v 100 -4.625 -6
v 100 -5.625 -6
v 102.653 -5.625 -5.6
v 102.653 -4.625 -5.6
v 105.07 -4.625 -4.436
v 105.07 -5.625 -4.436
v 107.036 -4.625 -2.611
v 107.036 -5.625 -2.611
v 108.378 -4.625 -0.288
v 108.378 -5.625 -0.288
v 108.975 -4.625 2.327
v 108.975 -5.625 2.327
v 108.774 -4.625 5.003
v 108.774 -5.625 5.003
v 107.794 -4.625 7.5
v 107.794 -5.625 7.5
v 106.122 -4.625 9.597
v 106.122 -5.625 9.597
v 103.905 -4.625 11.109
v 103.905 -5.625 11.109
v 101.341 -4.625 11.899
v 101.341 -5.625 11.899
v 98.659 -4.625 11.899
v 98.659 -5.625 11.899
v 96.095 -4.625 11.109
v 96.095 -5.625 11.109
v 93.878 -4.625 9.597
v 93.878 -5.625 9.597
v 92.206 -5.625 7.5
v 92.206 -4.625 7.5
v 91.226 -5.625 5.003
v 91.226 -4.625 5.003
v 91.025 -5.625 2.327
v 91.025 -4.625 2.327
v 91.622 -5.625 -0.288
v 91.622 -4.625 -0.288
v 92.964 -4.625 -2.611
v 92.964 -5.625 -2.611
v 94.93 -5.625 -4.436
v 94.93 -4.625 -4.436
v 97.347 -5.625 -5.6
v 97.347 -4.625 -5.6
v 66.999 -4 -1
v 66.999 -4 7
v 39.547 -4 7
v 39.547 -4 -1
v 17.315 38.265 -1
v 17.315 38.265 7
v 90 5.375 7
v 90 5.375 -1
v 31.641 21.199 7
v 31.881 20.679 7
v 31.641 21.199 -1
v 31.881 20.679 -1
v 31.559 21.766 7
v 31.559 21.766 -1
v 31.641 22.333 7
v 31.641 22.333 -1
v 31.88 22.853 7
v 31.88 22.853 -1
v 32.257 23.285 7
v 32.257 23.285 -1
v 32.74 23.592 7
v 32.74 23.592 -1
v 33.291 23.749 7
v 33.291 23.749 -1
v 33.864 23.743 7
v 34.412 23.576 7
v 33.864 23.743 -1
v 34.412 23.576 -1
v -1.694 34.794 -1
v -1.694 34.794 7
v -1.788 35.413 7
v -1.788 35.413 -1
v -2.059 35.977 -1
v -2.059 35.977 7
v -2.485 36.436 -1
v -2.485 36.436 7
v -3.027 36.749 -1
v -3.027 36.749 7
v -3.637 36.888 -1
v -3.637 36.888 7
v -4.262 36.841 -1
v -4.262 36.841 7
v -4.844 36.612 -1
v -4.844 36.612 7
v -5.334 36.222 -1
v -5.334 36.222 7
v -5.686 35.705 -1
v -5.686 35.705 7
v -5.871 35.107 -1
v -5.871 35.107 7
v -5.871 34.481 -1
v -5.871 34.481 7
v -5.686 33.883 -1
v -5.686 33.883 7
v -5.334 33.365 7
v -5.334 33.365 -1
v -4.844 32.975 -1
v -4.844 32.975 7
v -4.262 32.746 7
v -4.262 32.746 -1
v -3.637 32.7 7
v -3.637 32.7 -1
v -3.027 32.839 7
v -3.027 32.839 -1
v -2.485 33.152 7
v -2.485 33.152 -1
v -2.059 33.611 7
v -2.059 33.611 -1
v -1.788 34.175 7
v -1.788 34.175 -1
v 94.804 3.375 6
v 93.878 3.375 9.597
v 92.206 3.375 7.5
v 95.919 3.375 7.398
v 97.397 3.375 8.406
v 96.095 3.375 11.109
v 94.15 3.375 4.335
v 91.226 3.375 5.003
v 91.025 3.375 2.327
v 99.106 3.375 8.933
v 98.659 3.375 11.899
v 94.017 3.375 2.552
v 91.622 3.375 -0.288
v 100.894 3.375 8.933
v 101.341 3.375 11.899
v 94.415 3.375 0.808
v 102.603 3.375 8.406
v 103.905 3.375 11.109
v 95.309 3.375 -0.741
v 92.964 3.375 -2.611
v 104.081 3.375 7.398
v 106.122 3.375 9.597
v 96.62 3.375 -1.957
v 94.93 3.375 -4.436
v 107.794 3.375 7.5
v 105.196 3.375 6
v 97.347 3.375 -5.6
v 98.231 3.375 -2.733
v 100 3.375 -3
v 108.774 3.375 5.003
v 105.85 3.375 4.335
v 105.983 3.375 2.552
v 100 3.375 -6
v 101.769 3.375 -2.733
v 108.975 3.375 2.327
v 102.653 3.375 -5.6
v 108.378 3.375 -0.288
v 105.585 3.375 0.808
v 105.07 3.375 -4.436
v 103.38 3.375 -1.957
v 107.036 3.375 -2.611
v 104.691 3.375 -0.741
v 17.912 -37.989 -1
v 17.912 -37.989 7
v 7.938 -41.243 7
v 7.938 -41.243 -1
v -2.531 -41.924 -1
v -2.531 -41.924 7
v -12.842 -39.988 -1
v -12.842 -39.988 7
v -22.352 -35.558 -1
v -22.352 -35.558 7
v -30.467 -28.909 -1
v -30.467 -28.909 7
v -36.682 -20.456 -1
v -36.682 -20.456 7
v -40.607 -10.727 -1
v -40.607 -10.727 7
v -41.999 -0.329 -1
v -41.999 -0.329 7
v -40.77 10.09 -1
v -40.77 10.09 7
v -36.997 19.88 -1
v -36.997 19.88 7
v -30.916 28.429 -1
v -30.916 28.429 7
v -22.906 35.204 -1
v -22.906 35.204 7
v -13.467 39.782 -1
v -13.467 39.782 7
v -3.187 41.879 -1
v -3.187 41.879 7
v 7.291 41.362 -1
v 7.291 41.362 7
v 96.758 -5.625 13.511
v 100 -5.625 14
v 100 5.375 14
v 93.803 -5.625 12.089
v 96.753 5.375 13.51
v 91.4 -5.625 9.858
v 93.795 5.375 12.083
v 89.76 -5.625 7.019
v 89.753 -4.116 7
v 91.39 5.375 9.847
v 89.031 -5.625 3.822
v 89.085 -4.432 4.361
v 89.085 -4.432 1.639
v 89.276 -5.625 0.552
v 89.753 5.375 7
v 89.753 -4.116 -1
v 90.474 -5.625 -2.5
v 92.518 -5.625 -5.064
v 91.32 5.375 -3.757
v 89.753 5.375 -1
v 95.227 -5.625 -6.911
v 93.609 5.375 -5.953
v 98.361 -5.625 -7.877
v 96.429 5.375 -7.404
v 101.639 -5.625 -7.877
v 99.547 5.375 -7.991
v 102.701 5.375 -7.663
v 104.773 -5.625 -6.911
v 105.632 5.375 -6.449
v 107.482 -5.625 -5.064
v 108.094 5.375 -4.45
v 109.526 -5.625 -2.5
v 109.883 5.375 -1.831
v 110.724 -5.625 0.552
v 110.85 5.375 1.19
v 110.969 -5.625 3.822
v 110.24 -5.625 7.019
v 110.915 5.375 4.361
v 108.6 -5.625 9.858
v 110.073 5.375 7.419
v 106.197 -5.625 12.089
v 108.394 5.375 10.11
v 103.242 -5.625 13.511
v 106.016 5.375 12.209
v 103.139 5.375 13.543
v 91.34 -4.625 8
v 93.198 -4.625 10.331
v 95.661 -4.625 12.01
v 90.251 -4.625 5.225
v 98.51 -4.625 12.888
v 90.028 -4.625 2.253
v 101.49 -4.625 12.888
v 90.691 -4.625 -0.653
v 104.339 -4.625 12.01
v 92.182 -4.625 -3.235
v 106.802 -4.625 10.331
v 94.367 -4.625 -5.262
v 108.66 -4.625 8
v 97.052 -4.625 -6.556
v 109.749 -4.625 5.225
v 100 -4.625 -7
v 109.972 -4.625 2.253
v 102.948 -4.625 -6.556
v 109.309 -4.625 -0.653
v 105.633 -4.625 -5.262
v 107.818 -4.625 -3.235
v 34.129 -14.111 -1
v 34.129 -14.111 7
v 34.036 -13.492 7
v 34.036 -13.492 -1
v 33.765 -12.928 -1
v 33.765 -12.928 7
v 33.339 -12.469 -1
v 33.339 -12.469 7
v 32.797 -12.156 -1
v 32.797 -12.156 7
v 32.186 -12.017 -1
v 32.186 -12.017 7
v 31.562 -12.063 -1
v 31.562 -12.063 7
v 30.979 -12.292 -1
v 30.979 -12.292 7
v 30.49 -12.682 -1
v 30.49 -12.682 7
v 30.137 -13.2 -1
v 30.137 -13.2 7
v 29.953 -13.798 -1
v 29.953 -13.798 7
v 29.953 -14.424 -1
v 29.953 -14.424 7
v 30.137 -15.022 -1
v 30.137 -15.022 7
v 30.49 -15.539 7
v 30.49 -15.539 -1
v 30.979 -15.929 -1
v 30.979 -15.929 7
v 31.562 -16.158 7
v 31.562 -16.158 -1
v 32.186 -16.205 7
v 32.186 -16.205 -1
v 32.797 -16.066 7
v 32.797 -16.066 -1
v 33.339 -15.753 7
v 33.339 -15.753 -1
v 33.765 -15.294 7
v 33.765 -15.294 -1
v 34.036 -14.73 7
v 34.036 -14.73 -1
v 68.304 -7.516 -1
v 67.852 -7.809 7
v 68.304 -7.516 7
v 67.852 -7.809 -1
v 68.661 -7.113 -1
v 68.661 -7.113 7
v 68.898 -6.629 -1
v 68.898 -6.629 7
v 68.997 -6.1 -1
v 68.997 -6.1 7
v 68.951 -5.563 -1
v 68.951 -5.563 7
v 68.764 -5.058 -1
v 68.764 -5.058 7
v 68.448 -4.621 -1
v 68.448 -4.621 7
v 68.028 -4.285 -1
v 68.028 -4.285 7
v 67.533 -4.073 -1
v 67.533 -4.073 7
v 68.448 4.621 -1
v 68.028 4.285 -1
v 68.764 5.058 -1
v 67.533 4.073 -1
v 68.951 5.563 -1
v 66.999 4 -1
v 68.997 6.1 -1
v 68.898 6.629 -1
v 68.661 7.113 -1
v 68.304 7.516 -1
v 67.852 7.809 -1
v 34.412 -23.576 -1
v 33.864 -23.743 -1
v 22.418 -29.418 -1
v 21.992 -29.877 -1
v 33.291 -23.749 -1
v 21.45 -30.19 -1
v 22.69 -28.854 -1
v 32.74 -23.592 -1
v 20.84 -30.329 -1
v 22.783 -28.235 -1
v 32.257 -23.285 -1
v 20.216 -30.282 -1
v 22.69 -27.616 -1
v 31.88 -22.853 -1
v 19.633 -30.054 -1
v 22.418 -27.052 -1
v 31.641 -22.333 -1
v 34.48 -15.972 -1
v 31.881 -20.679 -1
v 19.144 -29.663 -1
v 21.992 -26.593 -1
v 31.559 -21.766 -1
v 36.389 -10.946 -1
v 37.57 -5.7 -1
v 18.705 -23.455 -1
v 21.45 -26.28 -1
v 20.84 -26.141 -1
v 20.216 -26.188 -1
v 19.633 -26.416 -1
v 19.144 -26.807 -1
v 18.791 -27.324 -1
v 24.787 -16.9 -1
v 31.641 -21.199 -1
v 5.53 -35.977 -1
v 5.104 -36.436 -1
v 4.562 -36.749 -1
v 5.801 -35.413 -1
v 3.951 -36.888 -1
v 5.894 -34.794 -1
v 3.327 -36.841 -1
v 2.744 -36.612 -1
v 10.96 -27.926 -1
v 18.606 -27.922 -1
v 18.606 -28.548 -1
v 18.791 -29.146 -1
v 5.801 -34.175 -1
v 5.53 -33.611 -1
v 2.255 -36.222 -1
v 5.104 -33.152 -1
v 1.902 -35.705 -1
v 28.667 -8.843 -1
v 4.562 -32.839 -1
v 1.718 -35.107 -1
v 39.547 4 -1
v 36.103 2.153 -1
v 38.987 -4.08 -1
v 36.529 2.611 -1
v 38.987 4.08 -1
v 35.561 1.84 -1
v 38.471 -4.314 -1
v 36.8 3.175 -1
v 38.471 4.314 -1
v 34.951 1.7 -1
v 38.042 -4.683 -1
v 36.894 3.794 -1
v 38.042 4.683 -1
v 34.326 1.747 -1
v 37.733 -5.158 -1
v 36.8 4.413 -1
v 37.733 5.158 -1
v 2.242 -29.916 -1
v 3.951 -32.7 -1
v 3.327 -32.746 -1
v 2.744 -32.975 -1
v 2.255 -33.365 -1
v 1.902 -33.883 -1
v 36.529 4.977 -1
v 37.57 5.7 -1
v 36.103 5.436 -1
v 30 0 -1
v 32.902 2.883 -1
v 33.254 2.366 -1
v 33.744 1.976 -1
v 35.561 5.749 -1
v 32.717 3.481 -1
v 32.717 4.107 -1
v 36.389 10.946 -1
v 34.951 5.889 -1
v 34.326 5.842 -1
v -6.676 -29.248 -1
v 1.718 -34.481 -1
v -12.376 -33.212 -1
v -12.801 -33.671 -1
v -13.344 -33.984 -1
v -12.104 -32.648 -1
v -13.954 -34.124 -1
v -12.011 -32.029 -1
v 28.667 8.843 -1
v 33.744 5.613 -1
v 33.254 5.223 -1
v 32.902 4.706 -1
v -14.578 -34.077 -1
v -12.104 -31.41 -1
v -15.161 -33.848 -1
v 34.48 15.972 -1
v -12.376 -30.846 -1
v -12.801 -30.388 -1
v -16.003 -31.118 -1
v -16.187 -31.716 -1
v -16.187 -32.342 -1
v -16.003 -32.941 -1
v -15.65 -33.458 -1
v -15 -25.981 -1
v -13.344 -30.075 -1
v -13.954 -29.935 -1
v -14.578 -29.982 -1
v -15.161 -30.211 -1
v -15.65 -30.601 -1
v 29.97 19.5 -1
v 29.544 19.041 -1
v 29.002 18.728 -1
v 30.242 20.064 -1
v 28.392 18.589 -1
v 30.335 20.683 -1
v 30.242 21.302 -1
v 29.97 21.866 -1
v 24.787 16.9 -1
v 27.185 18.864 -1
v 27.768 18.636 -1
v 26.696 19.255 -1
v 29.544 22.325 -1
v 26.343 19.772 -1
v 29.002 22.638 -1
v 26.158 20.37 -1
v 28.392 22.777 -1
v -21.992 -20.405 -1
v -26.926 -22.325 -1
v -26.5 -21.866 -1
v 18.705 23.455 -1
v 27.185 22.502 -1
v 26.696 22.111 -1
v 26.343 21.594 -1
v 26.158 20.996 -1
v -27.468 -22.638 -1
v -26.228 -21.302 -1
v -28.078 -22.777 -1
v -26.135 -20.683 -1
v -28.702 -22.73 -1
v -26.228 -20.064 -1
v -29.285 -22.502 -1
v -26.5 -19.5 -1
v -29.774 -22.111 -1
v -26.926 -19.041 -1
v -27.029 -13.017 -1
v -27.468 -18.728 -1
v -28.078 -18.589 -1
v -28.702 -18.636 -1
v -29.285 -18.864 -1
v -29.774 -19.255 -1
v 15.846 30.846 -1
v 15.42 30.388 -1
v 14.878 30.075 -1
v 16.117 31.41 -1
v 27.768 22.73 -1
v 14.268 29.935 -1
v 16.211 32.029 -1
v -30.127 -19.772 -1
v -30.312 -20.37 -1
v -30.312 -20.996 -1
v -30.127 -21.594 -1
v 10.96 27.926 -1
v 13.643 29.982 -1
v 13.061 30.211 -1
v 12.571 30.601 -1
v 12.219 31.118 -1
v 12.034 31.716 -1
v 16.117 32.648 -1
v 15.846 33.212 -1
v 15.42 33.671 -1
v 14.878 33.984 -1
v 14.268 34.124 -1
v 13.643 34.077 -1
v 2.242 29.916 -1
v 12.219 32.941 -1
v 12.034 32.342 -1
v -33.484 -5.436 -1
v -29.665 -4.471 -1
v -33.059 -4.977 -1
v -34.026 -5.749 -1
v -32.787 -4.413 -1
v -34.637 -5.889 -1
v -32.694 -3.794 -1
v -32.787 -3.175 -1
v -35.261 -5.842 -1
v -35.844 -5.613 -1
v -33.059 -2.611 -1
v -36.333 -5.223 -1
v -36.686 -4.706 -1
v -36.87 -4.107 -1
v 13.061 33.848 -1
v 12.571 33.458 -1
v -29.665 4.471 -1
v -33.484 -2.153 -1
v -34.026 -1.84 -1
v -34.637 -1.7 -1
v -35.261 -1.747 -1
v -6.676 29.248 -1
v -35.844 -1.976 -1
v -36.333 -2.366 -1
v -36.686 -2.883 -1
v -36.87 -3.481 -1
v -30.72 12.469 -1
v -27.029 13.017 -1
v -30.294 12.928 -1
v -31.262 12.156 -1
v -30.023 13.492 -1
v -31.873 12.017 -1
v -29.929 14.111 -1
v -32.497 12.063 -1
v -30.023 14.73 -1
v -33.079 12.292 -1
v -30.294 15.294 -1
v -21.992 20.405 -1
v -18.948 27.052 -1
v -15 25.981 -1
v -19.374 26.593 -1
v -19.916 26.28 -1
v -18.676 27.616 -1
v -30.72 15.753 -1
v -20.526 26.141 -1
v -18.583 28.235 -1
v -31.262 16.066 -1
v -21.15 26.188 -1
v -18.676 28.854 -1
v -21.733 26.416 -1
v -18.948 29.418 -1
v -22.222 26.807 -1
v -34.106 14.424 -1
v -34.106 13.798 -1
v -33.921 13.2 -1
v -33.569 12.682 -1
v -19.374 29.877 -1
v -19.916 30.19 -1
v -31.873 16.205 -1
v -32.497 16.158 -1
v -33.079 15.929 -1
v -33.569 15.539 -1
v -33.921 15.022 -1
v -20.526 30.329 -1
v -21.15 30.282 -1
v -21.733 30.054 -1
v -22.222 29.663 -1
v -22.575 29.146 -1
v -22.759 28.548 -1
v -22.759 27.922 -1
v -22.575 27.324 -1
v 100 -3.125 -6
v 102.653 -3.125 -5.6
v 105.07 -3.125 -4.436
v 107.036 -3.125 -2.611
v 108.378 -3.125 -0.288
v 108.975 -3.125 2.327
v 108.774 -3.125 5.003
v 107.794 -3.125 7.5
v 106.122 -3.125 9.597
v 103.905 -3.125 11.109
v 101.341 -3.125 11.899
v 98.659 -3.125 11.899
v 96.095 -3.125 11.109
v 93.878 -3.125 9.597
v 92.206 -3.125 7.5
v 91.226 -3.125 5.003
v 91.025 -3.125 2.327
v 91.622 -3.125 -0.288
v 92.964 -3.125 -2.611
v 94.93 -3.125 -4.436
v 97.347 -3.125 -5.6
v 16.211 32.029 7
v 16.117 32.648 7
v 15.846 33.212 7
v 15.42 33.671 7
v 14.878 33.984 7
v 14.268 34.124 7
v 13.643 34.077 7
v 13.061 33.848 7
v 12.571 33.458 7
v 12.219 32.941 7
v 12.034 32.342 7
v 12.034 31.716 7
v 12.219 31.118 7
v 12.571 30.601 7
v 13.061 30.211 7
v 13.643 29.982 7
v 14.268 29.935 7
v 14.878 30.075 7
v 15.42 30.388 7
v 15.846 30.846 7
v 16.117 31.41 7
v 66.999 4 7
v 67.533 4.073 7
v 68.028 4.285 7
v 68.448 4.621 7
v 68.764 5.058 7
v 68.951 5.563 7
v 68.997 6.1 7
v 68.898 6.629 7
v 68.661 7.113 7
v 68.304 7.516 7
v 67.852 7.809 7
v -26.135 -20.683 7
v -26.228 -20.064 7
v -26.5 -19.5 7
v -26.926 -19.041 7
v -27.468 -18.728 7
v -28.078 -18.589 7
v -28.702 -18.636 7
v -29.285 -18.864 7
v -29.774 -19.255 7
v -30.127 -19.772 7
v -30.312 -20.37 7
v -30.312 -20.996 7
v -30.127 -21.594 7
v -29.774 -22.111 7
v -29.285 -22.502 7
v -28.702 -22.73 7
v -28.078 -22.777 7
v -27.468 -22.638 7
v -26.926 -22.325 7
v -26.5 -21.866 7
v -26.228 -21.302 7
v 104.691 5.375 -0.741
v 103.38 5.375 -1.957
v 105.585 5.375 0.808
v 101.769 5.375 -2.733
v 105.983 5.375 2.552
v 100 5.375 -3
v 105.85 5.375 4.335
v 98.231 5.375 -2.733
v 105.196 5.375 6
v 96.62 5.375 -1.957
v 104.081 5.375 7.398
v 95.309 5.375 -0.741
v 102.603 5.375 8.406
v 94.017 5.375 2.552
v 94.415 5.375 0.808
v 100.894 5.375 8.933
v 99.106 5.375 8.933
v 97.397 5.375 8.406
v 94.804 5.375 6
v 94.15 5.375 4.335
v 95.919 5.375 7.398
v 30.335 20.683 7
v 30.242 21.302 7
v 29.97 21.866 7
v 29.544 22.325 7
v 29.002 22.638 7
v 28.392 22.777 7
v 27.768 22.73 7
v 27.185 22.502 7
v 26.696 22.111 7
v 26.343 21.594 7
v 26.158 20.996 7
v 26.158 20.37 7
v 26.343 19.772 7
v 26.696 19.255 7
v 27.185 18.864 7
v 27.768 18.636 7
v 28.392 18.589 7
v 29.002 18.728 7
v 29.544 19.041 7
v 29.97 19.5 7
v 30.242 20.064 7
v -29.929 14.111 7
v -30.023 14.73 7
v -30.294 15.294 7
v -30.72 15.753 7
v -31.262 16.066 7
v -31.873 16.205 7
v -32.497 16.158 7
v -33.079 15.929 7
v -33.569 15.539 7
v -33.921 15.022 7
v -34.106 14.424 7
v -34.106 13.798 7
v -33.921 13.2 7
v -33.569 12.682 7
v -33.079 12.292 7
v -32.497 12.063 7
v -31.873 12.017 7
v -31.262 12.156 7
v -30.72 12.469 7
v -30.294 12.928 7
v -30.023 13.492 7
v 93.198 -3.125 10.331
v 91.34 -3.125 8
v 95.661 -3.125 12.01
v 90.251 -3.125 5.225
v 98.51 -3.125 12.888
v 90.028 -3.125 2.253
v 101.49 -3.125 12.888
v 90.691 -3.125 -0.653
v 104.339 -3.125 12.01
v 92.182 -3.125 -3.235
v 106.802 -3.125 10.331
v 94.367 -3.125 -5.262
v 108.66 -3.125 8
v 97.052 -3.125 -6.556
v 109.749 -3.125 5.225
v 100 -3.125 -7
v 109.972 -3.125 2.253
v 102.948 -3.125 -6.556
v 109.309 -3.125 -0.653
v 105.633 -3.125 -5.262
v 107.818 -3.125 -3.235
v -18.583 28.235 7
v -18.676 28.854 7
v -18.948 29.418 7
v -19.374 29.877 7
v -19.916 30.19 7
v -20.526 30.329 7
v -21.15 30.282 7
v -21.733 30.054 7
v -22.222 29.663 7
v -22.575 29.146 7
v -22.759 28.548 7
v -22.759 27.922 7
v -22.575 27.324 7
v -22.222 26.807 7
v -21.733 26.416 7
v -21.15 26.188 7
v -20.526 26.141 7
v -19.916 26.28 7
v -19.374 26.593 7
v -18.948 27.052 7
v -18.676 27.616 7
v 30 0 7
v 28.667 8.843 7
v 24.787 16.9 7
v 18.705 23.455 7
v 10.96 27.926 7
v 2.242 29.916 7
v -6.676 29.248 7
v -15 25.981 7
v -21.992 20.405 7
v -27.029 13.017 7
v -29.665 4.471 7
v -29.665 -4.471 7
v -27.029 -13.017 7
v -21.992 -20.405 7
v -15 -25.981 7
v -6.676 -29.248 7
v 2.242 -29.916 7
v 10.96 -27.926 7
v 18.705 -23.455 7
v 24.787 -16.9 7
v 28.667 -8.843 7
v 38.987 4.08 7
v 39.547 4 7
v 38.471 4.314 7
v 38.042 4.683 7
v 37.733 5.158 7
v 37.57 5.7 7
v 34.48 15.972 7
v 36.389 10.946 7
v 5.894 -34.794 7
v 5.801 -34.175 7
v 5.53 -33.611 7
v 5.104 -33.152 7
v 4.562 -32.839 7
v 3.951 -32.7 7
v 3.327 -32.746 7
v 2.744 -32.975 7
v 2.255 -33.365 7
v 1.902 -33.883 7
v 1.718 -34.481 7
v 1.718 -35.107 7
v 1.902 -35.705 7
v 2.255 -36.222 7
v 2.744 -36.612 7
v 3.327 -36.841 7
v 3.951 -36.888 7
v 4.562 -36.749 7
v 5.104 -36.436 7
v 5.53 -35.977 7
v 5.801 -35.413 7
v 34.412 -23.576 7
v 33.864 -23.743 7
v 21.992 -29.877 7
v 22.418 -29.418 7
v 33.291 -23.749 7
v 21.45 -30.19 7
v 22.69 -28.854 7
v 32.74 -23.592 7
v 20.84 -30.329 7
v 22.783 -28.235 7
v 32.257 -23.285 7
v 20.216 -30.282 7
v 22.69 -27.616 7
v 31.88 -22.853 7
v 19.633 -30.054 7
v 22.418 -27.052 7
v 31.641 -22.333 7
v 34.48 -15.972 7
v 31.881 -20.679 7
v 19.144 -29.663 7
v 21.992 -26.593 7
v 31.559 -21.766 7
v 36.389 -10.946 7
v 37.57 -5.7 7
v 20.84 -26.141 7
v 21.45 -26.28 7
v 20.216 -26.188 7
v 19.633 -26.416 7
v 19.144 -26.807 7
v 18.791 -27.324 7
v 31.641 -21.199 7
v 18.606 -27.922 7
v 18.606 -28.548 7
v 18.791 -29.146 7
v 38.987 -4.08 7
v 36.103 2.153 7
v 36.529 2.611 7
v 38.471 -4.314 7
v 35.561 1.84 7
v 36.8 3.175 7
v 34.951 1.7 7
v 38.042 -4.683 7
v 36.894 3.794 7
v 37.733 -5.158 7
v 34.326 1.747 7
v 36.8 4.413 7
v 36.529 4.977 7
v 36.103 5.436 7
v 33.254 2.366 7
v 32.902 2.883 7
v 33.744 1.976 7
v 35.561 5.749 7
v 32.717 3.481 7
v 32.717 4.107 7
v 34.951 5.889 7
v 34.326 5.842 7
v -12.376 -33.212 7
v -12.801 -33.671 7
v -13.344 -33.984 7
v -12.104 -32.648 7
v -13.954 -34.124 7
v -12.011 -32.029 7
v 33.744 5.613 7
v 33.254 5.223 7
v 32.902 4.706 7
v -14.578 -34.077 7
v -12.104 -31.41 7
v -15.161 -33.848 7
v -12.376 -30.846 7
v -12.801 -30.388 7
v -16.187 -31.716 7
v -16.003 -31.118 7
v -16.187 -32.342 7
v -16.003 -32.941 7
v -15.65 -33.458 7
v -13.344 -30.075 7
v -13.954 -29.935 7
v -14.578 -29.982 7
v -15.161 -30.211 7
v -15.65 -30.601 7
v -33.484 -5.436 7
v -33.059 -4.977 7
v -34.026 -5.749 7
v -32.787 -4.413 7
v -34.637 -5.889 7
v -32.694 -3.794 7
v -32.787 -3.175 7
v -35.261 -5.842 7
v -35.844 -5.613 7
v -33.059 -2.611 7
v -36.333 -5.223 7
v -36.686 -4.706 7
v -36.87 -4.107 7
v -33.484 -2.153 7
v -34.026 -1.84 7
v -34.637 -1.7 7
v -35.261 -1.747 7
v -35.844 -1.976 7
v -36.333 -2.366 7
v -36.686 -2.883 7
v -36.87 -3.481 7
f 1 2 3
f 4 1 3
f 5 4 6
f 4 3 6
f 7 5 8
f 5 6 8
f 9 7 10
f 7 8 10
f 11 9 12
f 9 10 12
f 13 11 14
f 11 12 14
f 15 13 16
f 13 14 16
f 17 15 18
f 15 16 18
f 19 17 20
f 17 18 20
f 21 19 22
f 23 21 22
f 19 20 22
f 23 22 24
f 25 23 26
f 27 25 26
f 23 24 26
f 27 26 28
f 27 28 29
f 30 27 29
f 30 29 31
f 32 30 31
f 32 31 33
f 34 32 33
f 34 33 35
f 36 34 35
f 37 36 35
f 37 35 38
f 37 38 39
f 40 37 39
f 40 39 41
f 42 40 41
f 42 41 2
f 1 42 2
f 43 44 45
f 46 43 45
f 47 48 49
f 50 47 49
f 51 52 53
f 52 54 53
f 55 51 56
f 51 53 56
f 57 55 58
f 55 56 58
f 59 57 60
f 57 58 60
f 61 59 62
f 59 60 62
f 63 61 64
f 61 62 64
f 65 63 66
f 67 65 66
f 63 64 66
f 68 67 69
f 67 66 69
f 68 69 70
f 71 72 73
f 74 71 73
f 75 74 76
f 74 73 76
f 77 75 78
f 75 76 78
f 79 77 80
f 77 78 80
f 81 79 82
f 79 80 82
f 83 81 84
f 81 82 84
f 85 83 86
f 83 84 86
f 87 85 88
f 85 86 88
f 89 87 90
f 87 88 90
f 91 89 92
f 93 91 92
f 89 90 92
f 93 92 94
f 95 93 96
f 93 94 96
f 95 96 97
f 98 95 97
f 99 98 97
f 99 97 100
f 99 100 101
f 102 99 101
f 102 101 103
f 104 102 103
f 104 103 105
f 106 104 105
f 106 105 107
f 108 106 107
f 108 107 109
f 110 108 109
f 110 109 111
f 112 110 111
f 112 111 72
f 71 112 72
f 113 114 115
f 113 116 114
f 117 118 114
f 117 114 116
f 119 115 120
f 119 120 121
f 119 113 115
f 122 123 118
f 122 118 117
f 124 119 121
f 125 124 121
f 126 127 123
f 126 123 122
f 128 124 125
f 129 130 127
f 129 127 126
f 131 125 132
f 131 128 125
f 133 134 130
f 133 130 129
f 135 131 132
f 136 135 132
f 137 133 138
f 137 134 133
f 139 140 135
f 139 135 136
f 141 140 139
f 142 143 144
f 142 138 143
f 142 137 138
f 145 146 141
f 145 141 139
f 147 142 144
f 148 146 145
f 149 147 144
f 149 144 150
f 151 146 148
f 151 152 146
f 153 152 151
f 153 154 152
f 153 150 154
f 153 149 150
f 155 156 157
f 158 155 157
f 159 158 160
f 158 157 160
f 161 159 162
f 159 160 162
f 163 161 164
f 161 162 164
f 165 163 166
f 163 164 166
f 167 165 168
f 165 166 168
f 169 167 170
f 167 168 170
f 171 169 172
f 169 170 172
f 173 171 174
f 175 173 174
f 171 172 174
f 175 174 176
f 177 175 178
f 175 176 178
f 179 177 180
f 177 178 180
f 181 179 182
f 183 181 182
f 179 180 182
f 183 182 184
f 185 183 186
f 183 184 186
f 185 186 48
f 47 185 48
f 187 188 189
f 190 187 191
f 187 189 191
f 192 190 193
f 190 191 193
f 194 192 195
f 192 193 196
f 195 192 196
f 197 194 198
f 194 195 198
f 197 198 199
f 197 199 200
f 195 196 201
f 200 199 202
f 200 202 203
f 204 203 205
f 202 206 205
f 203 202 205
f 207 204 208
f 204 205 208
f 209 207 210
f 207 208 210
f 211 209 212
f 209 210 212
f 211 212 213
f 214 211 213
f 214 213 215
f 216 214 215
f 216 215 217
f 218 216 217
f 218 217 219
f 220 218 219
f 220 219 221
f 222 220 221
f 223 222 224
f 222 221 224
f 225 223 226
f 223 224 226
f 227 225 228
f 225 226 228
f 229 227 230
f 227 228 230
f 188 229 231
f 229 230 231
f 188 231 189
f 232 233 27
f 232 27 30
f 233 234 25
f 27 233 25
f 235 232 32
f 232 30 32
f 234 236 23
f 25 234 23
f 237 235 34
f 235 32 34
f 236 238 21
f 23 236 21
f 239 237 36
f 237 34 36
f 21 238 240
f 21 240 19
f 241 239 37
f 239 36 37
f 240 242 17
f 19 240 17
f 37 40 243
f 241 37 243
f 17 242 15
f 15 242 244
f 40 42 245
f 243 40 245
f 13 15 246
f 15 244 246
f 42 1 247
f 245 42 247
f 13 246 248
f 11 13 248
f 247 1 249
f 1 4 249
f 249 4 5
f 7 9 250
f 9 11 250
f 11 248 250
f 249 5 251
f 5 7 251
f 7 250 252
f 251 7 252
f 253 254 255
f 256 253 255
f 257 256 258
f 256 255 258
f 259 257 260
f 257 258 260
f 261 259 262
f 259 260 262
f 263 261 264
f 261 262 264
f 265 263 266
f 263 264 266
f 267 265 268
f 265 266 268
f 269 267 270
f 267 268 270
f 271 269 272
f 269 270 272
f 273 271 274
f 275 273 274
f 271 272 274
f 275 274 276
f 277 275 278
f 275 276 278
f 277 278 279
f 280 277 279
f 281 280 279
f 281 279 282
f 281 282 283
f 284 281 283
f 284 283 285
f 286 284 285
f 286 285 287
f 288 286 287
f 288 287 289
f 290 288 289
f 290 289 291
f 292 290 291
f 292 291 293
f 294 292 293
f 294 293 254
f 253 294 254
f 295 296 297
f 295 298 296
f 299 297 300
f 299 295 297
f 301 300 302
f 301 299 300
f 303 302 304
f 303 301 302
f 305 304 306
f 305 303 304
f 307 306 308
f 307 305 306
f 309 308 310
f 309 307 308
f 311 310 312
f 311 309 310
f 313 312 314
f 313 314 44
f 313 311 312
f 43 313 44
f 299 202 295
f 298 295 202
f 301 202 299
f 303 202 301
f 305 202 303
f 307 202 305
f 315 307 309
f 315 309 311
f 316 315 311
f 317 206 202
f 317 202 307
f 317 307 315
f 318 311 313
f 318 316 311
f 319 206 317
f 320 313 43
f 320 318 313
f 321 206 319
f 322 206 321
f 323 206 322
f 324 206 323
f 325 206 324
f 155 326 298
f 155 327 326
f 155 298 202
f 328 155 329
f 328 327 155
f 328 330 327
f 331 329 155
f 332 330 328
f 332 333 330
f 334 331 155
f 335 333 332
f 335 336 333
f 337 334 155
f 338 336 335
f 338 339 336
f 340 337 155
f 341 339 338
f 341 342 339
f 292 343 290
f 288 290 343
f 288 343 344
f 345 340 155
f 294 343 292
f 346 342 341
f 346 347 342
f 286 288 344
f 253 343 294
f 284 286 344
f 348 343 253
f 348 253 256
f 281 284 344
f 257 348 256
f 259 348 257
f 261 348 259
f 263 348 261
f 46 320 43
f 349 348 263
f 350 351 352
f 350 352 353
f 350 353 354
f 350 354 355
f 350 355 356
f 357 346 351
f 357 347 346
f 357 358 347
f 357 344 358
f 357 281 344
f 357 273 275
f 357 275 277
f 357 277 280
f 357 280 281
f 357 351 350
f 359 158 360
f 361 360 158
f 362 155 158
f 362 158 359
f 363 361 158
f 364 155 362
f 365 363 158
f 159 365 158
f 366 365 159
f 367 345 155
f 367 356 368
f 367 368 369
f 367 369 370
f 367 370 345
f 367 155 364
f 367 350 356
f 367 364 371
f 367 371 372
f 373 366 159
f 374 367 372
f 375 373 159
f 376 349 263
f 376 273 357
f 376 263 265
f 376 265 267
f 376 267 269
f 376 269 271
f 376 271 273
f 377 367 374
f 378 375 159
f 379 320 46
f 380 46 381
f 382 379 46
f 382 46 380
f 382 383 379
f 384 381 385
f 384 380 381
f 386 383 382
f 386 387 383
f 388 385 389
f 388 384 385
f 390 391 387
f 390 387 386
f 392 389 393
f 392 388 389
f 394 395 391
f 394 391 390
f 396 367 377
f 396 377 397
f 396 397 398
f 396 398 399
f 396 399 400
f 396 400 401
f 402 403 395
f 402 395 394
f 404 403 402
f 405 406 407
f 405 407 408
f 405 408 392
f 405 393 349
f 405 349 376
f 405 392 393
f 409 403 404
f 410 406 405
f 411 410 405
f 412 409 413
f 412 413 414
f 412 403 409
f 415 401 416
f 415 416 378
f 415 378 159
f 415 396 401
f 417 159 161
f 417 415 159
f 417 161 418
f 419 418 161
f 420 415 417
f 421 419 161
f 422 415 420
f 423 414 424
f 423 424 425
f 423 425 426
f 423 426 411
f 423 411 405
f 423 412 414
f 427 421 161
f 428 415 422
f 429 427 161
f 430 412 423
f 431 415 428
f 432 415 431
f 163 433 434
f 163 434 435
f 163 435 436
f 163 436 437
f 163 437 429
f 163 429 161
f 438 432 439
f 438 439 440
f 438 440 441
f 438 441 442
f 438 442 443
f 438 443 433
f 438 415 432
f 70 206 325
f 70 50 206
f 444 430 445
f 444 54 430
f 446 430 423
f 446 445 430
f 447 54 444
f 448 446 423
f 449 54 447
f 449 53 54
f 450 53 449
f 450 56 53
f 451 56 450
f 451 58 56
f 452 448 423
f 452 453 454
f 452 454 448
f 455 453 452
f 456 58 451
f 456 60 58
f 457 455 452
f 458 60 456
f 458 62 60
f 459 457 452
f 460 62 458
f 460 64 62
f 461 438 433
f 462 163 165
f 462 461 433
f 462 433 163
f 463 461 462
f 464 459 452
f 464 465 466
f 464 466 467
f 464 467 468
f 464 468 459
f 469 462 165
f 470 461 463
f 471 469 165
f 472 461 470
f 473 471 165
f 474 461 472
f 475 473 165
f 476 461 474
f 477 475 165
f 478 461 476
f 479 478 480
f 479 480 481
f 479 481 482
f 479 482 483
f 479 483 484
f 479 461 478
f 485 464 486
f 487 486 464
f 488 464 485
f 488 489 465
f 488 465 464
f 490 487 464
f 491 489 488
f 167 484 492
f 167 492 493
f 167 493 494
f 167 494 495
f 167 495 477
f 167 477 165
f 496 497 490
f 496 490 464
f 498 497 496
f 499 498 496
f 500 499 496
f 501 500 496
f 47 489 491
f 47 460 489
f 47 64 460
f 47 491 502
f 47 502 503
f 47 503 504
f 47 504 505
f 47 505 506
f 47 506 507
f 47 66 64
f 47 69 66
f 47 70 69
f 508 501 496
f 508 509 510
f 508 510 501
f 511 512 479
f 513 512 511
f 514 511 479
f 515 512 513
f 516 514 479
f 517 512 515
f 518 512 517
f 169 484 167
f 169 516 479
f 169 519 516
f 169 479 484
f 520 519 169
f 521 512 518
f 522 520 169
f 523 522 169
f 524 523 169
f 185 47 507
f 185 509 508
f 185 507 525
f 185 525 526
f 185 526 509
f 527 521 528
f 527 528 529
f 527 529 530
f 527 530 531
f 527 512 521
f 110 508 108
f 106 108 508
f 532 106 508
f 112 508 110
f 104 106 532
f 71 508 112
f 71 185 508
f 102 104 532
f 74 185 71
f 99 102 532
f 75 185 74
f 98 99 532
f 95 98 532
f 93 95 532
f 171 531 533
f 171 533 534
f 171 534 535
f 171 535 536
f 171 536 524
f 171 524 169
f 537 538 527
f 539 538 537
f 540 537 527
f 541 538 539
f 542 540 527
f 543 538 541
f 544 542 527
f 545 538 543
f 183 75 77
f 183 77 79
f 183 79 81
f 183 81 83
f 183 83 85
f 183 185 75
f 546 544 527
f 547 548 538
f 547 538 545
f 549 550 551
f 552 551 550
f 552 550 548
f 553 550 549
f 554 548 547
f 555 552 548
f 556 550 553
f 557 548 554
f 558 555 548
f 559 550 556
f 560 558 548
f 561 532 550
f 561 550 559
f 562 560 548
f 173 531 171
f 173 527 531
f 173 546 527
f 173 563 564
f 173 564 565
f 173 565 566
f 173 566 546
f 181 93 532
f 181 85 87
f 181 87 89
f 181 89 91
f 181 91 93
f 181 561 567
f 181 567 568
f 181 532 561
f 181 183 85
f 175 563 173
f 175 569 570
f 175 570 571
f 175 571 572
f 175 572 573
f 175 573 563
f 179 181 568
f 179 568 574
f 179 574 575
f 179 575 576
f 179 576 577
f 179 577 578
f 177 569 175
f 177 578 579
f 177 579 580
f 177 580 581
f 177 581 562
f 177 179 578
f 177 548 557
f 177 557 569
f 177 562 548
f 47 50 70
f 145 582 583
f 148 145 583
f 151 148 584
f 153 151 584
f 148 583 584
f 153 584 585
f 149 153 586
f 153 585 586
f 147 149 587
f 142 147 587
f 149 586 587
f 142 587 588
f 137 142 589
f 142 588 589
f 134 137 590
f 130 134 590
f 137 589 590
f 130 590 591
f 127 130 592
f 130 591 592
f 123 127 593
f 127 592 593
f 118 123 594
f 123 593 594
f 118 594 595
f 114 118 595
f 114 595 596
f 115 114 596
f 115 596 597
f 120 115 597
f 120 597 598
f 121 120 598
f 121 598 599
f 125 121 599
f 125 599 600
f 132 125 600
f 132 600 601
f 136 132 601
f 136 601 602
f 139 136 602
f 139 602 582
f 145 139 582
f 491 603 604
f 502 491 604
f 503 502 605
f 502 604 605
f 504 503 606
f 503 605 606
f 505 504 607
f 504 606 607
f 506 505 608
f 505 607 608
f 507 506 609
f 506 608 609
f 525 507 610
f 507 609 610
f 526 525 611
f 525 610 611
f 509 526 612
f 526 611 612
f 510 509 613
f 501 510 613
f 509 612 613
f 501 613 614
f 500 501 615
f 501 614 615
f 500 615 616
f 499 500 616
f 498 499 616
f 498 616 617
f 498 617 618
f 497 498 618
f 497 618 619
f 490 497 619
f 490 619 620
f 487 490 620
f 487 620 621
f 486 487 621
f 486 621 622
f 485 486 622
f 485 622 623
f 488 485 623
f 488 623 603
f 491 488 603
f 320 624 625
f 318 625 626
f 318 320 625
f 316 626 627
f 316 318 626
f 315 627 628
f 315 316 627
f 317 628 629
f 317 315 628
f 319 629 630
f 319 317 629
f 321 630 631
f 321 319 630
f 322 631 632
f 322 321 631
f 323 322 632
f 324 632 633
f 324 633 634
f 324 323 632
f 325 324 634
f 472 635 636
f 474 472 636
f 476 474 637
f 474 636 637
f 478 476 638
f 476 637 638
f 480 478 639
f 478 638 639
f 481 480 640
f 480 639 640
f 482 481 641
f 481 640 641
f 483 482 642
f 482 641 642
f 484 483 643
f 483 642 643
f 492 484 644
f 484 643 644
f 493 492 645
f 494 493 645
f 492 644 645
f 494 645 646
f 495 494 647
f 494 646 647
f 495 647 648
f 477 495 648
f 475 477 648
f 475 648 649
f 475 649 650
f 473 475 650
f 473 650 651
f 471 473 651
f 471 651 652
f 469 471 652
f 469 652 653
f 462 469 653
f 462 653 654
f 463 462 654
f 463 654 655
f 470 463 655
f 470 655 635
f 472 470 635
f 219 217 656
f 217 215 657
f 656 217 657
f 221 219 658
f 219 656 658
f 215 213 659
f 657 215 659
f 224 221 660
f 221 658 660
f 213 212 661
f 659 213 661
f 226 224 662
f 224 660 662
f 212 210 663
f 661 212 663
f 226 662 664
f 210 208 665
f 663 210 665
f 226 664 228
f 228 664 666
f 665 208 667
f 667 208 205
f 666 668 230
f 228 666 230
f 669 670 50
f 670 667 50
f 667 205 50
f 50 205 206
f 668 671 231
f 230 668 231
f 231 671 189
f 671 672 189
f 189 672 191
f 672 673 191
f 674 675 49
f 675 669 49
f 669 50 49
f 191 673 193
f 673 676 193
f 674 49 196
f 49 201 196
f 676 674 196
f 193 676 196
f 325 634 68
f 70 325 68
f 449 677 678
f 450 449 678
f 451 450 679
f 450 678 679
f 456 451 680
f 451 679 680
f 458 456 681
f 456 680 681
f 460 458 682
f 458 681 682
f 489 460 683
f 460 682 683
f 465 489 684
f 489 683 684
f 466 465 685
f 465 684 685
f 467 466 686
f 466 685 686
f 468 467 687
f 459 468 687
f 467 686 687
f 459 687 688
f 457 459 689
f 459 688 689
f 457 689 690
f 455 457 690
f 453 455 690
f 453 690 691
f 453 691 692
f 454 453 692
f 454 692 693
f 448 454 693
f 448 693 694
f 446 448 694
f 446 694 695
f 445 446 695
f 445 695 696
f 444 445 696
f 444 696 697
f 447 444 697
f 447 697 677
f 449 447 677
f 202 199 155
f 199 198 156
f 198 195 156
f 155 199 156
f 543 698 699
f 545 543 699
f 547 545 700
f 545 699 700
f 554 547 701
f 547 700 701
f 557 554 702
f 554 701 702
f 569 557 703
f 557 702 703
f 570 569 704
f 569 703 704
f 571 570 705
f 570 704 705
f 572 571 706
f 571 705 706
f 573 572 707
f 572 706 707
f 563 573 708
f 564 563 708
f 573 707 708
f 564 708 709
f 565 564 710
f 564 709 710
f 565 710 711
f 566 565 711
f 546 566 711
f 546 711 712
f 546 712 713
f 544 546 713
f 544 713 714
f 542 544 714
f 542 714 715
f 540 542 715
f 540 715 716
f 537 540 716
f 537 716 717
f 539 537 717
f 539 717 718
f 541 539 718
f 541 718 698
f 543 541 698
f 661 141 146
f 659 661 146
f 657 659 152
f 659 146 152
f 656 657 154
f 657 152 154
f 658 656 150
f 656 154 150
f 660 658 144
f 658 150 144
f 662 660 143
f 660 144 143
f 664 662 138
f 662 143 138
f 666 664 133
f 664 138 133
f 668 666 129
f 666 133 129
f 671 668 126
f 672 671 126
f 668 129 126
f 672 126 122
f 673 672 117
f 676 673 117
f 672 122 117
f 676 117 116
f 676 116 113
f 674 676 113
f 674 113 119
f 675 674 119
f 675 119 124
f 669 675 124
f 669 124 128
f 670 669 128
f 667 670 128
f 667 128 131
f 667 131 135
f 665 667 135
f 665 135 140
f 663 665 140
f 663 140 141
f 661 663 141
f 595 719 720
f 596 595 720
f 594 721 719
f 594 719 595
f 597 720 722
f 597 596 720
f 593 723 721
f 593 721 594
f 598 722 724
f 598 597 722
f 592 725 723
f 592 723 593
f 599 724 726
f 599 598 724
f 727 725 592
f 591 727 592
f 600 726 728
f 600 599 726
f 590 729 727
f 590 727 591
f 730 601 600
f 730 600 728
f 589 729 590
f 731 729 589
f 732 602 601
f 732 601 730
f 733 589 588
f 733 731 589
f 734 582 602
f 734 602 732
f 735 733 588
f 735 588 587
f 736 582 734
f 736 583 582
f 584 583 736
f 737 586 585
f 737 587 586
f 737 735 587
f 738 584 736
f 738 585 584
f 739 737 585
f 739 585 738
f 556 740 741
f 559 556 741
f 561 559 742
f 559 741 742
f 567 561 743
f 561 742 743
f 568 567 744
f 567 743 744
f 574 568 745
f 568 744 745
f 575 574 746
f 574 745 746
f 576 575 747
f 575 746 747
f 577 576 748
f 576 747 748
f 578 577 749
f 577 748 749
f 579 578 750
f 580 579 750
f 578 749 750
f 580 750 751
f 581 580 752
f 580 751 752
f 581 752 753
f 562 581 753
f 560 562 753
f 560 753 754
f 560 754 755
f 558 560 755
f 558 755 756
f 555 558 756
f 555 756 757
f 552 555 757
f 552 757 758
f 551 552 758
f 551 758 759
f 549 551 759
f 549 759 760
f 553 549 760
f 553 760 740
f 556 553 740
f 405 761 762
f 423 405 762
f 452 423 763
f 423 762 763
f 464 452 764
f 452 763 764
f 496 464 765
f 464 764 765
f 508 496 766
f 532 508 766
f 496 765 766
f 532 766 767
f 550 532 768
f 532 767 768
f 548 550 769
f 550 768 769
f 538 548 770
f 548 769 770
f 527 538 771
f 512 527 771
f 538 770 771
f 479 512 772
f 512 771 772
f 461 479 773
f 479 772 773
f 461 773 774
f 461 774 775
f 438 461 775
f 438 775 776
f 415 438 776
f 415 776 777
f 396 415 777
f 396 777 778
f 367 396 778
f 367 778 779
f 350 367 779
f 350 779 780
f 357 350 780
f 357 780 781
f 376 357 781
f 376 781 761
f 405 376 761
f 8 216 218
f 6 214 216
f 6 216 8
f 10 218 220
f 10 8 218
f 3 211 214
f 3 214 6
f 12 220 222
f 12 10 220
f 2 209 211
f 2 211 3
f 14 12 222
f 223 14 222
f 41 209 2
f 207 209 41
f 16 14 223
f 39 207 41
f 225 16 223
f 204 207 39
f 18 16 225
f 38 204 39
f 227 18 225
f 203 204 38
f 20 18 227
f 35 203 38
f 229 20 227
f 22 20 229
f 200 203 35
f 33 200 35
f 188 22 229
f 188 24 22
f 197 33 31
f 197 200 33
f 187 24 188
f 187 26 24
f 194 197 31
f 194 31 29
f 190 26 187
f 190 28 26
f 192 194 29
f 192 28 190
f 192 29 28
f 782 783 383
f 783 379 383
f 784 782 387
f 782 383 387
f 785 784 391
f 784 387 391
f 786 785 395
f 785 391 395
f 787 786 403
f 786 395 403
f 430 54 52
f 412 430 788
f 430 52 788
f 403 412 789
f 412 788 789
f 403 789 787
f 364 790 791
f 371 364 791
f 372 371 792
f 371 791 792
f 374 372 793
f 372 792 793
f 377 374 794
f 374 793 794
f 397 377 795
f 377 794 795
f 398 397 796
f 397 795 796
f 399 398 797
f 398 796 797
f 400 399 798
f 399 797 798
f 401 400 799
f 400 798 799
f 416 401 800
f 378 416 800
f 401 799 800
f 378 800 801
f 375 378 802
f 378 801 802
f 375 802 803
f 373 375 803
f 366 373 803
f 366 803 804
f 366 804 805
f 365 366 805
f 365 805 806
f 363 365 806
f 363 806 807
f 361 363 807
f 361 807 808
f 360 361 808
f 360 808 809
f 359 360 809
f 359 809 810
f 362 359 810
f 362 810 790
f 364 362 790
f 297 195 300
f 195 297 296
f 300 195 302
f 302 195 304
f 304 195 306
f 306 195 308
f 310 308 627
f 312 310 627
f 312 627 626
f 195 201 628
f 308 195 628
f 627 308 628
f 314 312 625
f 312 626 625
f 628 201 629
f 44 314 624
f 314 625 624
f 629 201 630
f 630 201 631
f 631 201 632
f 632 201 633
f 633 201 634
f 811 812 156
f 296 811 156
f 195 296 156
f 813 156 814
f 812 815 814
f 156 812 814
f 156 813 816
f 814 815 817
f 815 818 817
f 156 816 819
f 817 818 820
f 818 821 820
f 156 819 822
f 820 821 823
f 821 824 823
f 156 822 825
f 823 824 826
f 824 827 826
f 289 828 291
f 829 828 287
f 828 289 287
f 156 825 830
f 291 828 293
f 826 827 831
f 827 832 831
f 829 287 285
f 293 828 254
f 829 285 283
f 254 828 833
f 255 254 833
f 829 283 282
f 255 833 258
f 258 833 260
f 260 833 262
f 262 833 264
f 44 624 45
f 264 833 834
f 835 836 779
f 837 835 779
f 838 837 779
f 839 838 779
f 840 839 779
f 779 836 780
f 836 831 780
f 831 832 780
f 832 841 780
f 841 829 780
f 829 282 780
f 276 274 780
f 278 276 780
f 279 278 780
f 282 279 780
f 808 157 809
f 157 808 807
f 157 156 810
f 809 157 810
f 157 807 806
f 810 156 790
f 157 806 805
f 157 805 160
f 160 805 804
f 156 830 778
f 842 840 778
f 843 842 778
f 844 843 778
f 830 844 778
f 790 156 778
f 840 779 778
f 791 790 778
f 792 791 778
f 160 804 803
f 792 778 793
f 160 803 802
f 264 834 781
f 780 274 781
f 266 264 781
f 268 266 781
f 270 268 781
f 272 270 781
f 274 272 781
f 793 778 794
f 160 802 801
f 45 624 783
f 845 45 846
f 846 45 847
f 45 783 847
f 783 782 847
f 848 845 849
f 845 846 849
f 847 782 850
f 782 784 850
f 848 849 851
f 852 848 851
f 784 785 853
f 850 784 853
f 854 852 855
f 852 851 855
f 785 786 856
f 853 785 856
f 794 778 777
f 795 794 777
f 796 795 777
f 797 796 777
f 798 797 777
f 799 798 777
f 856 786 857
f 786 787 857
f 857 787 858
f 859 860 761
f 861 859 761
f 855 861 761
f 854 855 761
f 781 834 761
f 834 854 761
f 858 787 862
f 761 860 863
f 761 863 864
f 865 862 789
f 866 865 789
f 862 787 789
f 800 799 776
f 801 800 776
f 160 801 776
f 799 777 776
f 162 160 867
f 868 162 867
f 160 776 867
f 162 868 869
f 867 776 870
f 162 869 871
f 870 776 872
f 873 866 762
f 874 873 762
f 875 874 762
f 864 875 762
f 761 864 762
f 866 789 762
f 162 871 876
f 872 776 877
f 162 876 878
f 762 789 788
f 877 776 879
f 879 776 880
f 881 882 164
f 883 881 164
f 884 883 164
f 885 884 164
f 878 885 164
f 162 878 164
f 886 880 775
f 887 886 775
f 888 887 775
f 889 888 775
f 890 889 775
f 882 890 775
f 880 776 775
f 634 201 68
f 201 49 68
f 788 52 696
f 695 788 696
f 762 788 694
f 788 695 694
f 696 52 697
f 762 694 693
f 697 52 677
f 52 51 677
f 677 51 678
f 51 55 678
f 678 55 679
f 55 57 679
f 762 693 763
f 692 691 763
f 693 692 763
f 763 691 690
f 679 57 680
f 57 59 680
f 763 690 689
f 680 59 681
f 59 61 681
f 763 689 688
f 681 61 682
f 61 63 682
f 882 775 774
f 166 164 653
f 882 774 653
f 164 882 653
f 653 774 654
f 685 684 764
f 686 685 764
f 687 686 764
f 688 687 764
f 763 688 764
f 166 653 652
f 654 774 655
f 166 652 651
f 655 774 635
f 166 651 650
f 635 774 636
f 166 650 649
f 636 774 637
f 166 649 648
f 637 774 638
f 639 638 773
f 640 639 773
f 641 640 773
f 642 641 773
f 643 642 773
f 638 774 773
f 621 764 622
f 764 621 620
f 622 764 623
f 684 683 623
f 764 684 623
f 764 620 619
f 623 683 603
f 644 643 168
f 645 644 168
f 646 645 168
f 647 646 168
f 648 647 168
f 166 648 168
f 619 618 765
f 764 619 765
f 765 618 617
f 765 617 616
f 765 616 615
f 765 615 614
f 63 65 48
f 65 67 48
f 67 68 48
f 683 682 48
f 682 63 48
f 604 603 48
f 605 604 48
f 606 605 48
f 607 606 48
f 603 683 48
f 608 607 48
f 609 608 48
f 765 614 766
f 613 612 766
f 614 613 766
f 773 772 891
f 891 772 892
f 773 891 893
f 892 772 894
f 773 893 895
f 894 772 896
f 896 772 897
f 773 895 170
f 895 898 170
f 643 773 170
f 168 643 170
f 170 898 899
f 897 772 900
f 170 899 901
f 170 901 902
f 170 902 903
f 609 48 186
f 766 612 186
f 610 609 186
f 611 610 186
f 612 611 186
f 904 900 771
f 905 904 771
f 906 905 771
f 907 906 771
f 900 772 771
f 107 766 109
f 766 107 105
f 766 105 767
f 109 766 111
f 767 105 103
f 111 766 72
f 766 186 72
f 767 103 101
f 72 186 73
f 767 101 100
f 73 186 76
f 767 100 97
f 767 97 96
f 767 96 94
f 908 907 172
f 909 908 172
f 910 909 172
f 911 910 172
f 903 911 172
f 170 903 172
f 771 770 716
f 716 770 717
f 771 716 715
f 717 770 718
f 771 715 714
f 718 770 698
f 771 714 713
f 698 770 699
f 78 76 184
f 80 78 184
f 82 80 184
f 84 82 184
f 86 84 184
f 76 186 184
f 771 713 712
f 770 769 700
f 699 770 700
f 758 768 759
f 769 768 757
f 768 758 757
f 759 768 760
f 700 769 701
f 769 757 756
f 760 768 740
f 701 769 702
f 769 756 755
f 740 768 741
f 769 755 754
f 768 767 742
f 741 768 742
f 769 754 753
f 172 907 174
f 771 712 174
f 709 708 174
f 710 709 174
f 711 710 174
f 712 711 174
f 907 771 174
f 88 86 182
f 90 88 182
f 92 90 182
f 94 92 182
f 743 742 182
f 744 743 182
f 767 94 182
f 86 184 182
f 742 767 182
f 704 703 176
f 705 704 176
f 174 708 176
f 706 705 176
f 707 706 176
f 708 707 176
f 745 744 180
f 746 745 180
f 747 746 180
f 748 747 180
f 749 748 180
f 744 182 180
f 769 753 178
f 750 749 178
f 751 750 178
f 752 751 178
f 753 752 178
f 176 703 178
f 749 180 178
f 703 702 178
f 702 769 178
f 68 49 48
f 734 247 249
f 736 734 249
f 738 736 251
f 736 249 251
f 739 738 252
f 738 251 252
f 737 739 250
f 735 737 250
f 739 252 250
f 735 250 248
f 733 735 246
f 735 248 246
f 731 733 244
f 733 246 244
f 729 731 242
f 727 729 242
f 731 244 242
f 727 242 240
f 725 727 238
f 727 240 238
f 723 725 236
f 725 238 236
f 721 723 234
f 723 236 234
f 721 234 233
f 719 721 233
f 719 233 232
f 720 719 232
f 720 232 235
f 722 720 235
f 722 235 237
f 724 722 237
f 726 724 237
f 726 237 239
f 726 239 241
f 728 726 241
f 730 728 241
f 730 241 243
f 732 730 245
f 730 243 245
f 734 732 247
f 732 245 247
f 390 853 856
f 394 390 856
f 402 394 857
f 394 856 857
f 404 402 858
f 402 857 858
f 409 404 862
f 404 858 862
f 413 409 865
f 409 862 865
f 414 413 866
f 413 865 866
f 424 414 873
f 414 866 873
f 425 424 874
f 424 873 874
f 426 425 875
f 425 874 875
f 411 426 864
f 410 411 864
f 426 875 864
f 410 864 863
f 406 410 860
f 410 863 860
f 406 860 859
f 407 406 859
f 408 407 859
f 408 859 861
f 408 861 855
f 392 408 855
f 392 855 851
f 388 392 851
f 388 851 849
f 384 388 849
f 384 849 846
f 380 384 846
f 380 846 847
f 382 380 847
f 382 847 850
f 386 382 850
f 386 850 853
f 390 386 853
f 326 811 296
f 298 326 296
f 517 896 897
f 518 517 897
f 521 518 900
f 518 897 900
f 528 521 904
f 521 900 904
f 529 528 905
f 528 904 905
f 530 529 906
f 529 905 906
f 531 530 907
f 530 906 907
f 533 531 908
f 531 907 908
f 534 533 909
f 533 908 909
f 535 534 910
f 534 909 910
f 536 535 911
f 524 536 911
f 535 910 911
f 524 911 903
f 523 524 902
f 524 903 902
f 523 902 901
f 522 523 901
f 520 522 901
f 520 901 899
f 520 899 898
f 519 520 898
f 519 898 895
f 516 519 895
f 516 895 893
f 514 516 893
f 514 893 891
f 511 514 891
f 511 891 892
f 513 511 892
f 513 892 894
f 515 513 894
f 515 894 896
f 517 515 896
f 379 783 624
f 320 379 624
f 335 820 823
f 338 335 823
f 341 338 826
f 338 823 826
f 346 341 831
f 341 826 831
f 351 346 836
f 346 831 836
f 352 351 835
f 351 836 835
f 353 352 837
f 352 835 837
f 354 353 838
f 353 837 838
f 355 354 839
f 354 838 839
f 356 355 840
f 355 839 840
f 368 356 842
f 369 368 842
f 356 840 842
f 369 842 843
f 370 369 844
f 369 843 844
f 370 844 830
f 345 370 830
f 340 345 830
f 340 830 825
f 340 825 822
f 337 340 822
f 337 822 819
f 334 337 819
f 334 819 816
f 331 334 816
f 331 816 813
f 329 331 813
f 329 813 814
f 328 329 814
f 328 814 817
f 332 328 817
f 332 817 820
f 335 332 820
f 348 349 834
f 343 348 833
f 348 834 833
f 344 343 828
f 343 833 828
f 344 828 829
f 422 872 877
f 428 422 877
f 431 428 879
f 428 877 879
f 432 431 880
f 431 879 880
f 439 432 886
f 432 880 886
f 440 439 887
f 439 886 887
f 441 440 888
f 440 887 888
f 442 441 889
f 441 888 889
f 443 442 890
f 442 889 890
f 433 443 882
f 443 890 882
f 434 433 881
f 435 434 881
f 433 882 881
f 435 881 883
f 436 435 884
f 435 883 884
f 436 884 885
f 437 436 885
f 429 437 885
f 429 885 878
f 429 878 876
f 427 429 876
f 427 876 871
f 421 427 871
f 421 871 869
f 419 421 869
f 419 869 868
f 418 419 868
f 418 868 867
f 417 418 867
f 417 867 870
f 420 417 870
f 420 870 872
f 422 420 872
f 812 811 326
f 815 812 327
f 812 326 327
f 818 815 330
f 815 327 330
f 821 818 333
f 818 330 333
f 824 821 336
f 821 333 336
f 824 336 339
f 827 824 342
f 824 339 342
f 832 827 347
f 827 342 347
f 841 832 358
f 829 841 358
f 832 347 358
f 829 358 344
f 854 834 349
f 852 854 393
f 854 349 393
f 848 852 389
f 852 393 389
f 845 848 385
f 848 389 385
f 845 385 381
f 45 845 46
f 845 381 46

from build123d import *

# Parameters (mm, degrees)
SKETCH_1_R          = 42
EXTRUDE_1_DEPTH     = 3
SKETCH_2_W          = 11
SKETCH_2_H          = 11
EXTRUDE_2_DEPTH     = 4
SKETCH_4_R          = 6
CUT_EXTRUDE_1_DEPTH = 25
SKETCH_5_R          = 9
CUT_EXTRUDE_2_DEPTH = 9
CUT_EXTRUDE_START   = 8
SKETCH_6_R          = 10
SKETCH_6_R_2        = 9
CUT_EXTRUDE_3_DEPTH = 1.5
SKETCH_7_R          = 30
CUT_EXTRUDE_4_DEPTH = 30
FILLET_1_R          = 2
SKETCH_8_R          = 2.1
CUT_EXTRUDE_5_DEPTH = 120.624412224


with BuildPart() as part:
    # 草图1 → 凸台-拉伸1 (new body)
    with BuildSketch(Plane.XY):
        Circle(SKETCH_1_R)
    extrude(amount=EXTRUDE_1_DEPTH)



with BuildPart() as body_2:
    # 草图2 → 旋转1 (revolve)
    with BuildSketch(Plane.XY.offset(3), mode=Mode.PRIVATE) as revolve_1_sk:
        with Locations((94.5, -0.125)):
            Rectangle(SKETCH_2_W, SKETCH_2_H)
    revolve(revolve_1_sk.sketch.rotate(Axis((100, 22.717290725, 3), (0, -1, 0)), 270), axis=Axis((100, 22.717290725, 3), (0, -1, 0)))


with BuildPart() as part_1:
    add(part.part)

    add(body_2.part)  # 凸台-拉伸2 merges body 2
    # 草图3 → 凸台-拉伸2 (add, symmetric)
    with BuildSketch(Plane.XY.offset(3)):
        with BuildLine():
            Line((17.314737244, 38.264864748), (90, 5.375))
            Line((90, 5.375), (90, -4))
            Line((90, -4), (17.911593748, -37.989140678))
            ThreePointArc((17.911593748, -37.989140678), (-41.998713488, -0.328732965), (17.314737244, 38.264864748))
        make_face()
    extrude(amount=EXTRUDE_2_DEPTH, both=True)

    # 草图4 → 切除-拉伸1 (cut)
    with BuildSketch(Plane.XZ.offset(5.625)):
        with Locations(Location((100, 3, 0), (0, 0, 270))):
            Circle(SKETCH_4_R)
    extrude(amount=-CUT_EXTRUDE_1_DEPTH, mode=Mode.SUBTRACT)

    # 草图5 → 切除-拉伸2 (cut)
    with BuildSketch(Plane.XZ.offset(5.625)):
        with Locations(Location((100, 3, 0), (0, 0, 270))):
            Circle(SKETCH_5_R)
    extrude(amount=-CUT_EXTRUDE_2_DEPTH, mode=Mode.SUBTRACT)

    # 草图6 → 切除-拉伸3 (cut)
    # profile 1 of 2: a face of its own
    with BuildSketch(Plane.XZ.offset(-3.375).offset(CUT_EXTRUDE_START)):
        with Locations(Location((100, 3, 0), (0, 0, 270))):
            Circle(SKETCH_6_R)
        with Locations(Location((100, 3, 0), (0, 0, 270))):
            Circle(SKETCH_6_R_2, mode=Mode.SUBTRACT)
    # profile 2 of 2: a face of its own
    with BuildSketch(Plane.XZ.offset(-3.375).offset(CUT_EXTRUDE_START)):
        with Locations(Location((100, 3, 0), (0, 0, 270))):
            Circle(SKETCH_6_R_2)
    extrude(amount=-CUT_EXTRUDE_3_DEPTH, mode=Mode.SUBTRACT)

    # 草图7 → 切除-拉伸4 (cut)
    with BuildSketch(Plane.XY.offset(7)):
        Circle(SKETCH_7_R)
        with BuildLine():
            Line((26.356552806, -27.373931471), (75.930900201, -4))
            Line((75.930900201, -4), (37.788887255, -4))
            ThreePointArc((37.788887255, -4), (34.135678377, -16.695971422), (26.356552806, -27.373931471))
        make_face()
        with BuildLine():
            Line((37.788887255, 4), (75.930900201, 4))
            Line((75.930900201, 4), (26.356552806, 27.373931471))
            ThreePointArc((26.356552806, 27.373931471), (34.135678377, 16.695971422), (37.788887255, 4))
        make_face()
    extrude(amount=-CUT_EXTRUDE_4_DEPTH, mode=Mode.SUBTRACT)

    # 圆角1
    fillet_1_edges = [part_1.edges().sort_by_distance(p)[0] for p in [
        (37.788887255, 4, 3),
        (26.356552806, 27.373931471, 3),
        (75.930900201, 4, 3),
        (26.356552806, -27.373931471, 3),
        (37.788887255, -4, 3),
        (75.930900201, -4, 3),
    ]]
    fillet(fillet_1_edges, radius=FILLET_1_R)

    # 草图8 → 切除-拉伸5 (cut, through all)
    with BuildSketch(Plane.XY.offset(7)):
        with Locations((14.110790662, 32.029448745)):
            Circle(SKETCH_8_R)
        with Locations((-3.794421191, 34.793711613)):
            Circle(SKETCH_8_R)
        with Locations((-20.682920951, 28.235027553)):
            Circle(SKETCH_8_R)
        with Locations((-32.029448745, 14.110790662)):
            Circle(SKETCH_8_R)
        with Locations((-34.793711613, -3.794421191)):
            Circle(SKETCH_8_R)
        with Locations((-28.235027553, -20.682920951)):
            Circle(SKETCH_8_R)
        with Locations((-14.110790662, -32.029448745)):
            Circle(SKETCH_8_R)
        with Locations((3.794421191, -34.793711613)):
            Circle(SKETCH_8_R)
        with Locations((20.682920951, -28.235027553)):
            Circle(SKETCH_8_R)
        with Locations((32.029448745, -14.110790662)):
            Circle(SKETCH_8_R)
        with Locations((34.793711613, 3.794421191)):
            Circle(SKETCH_8_R)
        with Locations((28.235027553, 20.682920951)):
            Circle(SKETCH_8_R)
    extrude(amount=-CUT_EXTRUDE_5_DEPTH, mode=Mode.SUBTRACT)


solid = part_1.part
